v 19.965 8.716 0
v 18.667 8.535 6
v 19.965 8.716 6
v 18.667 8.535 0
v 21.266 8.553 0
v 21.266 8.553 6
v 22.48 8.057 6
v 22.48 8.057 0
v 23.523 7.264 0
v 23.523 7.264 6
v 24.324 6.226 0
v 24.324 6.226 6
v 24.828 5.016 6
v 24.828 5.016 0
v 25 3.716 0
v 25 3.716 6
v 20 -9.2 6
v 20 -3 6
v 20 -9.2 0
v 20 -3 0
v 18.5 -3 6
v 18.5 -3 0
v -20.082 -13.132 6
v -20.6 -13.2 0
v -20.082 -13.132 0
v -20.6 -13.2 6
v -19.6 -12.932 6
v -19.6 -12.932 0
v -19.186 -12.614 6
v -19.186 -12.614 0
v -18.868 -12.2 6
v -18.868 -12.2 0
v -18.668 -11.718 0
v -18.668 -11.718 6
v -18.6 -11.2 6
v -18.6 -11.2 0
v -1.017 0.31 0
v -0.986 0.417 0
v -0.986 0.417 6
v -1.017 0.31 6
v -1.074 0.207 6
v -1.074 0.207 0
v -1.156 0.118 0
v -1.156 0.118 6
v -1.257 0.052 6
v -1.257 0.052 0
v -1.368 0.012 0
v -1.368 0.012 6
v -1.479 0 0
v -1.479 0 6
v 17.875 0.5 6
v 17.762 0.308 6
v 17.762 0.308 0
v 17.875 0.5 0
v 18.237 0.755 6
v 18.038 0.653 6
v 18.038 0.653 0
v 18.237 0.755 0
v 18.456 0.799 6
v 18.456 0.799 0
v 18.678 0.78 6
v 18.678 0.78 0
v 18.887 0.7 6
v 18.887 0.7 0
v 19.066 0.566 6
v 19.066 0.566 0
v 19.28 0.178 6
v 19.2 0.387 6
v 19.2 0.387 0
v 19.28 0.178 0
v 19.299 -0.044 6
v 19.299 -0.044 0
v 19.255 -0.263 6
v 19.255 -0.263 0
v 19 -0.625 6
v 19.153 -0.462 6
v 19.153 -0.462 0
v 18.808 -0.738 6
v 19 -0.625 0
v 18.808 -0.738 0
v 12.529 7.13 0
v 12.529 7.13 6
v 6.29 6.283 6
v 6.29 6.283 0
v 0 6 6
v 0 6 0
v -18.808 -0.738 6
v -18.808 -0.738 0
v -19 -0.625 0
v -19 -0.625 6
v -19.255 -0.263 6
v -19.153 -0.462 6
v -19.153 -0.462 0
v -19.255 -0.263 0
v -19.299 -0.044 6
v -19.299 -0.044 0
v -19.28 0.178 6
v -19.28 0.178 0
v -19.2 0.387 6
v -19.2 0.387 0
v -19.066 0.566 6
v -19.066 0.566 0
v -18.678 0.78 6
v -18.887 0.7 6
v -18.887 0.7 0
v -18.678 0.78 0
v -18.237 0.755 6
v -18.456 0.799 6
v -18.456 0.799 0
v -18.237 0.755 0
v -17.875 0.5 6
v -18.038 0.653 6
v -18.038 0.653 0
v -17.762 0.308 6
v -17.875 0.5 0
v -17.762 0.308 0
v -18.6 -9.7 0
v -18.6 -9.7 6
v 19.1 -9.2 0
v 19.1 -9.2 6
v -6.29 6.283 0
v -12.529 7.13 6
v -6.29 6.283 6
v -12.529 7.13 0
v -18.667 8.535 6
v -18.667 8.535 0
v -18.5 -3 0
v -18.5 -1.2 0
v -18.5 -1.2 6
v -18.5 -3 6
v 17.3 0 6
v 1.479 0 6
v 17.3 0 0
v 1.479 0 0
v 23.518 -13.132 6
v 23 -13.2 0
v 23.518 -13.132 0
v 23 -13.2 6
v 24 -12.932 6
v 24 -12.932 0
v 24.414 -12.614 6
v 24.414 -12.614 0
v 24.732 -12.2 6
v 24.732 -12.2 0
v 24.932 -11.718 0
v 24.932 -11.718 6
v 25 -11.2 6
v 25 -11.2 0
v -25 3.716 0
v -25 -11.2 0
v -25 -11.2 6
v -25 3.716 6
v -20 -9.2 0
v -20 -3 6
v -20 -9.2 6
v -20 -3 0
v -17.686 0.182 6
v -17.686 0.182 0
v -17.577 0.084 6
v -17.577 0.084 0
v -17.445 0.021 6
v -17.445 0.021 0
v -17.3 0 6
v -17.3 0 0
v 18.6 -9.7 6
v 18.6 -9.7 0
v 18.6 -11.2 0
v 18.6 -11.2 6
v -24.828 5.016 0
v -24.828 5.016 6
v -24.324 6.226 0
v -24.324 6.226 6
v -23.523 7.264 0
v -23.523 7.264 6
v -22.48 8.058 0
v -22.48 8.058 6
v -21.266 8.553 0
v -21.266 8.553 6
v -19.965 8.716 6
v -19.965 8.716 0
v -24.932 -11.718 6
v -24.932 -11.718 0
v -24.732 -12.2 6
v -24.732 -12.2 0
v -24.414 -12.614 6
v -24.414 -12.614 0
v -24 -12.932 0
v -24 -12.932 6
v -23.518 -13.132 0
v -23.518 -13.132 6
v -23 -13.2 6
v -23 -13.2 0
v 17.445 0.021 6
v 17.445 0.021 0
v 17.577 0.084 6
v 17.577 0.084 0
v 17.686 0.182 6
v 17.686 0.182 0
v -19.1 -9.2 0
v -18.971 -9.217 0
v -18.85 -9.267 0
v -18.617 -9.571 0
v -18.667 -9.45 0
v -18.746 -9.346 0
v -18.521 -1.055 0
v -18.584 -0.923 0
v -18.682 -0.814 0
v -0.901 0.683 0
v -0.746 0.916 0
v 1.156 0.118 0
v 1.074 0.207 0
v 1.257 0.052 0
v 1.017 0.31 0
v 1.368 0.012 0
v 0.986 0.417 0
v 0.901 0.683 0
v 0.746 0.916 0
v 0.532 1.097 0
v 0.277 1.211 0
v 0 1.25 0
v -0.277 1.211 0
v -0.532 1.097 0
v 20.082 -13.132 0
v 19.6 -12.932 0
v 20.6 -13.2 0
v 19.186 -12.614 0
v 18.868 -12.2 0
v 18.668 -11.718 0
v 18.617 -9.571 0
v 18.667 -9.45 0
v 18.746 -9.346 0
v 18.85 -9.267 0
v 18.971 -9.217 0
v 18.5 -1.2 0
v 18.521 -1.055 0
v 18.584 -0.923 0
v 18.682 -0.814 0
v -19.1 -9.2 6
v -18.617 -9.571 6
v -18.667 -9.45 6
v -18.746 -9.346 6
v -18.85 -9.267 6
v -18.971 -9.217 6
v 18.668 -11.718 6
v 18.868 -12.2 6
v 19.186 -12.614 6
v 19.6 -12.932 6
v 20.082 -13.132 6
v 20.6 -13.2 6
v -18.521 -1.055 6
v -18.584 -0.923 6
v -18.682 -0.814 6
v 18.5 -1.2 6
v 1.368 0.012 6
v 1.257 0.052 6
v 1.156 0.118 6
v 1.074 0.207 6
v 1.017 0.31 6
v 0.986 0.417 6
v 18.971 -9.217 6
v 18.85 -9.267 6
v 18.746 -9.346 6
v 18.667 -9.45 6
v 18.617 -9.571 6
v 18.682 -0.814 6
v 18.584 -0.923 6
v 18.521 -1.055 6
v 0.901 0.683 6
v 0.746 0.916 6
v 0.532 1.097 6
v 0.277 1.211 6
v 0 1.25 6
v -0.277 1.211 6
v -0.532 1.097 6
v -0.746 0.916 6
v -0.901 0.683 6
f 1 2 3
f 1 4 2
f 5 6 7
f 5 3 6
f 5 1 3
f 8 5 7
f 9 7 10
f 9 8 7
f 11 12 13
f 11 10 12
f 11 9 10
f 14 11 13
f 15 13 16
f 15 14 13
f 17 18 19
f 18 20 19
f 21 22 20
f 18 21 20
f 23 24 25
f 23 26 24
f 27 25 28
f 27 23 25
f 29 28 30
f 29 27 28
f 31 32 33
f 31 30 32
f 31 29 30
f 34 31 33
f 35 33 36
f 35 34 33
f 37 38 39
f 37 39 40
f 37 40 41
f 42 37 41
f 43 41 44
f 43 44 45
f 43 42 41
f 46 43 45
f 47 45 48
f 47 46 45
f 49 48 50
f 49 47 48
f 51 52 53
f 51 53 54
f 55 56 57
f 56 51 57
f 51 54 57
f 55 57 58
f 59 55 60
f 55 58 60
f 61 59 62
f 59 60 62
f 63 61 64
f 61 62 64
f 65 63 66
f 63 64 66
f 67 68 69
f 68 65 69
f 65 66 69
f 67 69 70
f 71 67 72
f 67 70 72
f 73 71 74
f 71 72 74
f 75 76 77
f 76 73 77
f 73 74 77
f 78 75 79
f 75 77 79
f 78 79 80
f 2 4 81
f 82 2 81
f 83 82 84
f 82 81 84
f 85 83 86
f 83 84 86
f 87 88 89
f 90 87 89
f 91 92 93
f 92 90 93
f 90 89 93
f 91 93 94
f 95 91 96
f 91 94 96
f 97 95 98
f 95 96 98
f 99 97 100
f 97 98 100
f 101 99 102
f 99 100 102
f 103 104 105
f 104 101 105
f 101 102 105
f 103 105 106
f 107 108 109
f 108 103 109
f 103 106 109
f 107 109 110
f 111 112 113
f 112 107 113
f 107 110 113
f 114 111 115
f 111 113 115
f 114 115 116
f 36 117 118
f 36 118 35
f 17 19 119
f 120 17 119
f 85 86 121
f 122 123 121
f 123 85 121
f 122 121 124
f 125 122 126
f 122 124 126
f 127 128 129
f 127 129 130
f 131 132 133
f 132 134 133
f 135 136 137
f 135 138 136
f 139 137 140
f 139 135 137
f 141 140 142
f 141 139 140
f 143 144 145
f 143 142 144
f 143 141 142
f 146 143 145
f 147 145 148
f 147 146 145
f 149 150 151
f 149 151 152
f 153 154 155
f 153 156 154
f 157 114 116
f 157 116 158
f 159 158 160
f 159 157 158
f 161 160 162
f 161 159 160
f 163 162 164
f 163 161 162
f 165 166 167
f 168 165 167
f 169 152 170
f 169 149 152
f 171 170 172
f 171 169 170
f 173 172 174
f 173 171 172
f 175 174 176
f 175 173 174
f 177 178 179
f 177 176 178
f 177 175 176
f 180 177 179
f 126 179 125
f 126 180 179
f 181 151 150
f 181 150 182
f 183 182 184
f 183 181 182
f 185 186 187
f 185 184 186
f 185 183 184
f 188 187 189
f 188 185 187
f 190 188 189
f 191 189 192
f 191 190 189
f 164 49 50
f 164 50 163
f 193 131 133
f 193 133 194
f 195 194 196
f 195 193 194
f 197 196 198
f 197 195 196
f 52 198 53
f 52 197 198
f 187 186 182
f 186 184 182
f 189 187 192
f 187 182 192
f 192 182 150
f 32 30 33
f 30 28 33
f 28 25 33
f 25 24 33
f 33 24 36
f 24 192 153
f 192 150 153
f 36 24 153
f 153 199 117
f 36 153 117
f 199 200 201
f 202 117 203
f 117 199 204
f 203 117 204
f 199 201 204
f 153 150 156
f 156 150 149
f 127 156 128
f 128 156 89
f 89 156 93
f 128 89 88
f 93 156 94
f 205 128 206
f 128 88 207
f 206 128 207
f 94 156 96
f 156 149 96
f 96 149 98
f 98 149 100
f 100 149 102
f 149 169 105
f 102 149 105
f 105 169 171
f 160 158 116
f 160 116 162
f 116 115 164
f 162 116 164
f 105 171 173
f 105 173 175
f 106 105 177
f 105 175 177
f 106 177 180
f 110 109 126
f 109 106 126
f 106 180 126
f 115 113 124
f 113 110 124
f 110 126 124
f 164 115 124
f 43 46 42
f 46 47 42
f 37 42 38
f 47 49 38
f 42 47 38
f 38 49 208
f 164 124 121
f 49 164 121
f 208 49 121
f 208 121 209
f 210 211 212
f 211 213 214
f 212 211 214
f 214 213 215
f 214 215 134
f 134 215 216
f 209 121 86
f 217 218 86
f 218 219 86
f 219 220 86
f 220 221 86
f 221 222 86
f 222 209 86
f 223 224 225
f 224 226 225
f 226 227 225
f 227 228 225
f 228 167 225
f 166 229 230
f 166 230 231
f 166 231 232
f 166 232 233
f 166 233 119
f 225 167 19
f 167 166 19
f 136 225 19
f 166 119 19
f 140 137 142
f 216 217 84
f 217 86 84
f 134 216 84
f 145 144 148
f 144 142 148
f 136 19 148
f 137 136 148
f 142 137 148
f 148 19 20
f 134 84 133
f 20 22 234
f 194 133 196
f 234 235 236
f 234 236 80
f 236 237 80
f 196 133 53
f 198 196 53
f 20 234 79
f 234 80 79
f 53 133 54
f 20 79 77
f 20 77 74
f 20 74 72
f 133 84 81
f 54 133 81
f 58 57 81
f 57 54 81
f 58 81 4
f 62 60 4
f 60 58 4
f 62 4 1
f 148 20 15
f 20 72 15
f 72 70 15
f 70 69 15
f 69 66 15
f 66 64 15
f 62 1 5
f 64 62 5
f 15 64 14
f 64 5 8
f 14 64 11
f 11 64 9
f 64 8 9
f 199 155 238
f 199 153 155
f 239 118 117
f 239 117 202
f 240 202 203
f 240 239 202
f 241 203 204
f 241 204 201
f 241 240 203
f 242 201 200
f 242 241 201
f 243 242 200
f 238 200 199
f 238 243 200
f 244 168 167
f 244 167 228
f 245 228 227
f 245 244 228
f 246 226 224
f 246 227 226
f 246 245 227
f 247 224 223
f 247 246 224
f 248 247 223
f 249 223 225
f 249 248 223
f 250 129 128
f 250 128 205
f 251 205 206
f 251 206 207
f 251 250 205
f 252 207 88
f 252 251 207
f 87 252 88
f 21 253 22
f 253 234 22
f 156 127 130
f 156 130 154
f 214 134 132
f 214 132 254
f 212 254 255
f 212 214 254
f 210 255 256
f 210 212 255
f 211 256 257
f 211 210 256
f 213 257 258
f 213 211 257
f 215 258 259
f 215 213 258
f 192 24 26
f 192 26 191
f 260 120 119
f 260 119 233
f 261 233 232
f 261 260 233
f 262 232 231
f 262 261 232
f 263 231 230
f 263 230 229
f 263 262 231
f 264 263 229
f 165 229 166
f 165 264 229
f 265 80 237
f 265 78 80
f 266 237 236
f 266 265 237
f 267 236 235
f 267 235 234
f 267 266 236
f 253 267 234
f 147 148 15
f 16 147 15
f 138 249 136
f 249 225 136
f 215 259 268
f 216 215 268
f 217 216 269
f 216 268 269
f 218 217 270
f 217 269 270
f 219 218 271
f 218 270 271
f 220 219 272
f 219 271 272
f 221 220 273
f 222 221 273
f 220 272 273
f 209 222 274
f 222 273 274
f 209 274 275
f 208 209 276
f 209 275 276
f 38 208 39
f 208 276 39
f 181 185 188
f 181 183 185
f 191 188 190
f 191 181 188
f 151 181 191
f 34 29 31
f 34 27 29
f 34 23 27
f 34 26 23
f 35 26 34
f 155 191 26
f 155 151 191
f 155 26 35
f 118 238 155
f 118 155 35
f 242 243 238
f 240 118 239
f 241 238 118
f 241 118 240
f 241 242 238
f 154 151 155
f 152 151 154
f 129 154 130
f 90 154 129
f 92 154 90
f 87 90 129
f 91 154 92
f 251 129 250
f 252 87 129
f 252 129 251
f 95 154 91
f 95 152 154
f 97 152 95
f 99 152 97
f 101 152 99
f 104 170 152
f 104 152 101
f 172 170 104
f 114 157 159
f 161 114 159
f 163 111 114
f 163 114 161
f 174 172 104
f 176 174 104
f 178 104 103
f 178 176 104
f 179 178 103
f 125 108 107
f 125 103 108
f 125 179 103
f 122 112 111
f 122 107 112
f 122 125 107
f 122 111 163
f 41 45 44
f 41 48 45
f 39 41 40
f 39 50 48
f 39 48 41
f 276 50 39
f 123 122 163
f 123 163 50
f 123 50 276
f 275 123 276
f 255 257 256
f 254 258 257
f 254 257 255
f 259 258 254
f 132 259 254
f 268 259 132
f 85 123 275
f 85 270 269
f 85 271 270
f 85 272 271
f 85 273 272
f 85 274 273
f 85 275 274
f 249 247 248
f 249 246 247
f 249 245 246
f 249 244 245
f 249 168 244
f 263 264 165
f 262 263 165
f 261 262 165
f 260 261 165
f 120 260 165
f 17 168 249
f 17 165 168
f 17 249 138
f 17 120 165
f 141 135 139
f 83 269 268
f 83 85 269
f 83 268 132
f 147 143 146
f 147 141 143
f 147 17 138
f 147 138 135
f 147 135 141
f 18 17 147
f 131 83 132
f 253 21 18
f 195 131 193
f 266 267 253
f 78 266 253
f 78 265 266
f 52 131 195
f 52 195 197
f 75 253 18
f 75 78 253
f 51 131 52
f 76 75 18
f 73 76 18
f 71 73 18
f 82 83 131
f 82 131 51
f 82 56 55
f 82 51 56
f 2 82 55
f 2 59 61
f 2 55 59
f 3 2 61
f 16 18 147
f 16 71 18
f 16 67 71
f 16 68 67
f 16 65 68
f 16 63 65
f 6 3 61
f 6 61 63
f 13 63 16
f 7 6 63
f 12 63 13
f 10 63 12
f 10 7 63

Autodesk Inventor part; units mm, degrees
ref_plane "YZ Plane" through (0, 0, 0) normal (1, 0, 0) x (0, 1, 0)
ref_plane "XZ Plane" through (0, 0, 0) normal (0, 1, 0) x (-1, 0, 0)
ref_plane "XY Plane" through (0, 0, 0) normal (0, 0, 1) x (1, 0, 0)
sketch "Sketch1" plane through (0, 0, 0) normal (0, 0, 1) x (1, 0, 0)
  line L0 (0, 0) -> (-17.7, 0)
  line L1 (-20, -9.2) -> (-18.6, -9.2)
  line L2 (-18.6, -9.2) -> (-18.6, -13.2)
  line L3 (-18.6, -13.2) -> (-25, -13.2)
  line L4 (-25, -13.2) -> (-25, 3.7158)
  arc A0 (-18.6667, 8.5348) -> (-25, 3.7158) centre (-20, 3.7158) ccw
  arc A1 (-18.6667, 8.5348) -> (0, 6) centre (0, 76) ccw
  line L5 (0, 0) -> (0, 6) construction
  line L6 (-18.5, -0.8) -> (-18.5, -3)
  line L7 (-18.5, -3) -> (-20, -3)
  line L8 (-20, -3) -> (-20, -9.2)
  arc A2 (-17.7, 0) -> (-18.5, -0.8) centre (-18.5, 0) ccw
  line L9 (0, 0) -> (17.7, 0)
  line L10 (20, -9.2) -> (18.6, -9.2)
  line L11 (18.6, -9.2) -> (18.6, -13.2)
  line L12 (18.6, -13.2) -> (25, -13.2)
  line L13 (25, -13.2) -> (25, 3.7158)
  arc A3 (25, 3.7158) -> (18.6667, 8.5348) centre (20, 3.7158) ccw
  arc A4 (0, 6) -> (18.6667, 8.5348) centre (0, 76) ccw
  line L14 (18.5, -0.8) -> (18.5, -3)
  line L15 (18.5, -3) -> (20, -3)
  line L16 (20, -3) -> (20, -9.2)
  arc A5 (18.5, -0.8) -> (17.7, 0) centre (18.5, 0) ccw
  line L17 (-20, 8.7158) -> (20, 8.7158) construction
  dimension "d0" = 6
  dimension "d4" = 6.2
  dimension "d5" = 1.5
  dimension "d7" = 4
  dimension "d9" = 5
  dimension "d10" = 70
  dimension "d11" = 5
  dimension "d12" = 0.8
  dimension "d13" = 3
  dimension "d18" = 1.4
  dimension "d20" = 18.5
  dimension "d26" = 8.7158
extrude "Extrusion1" add sketch "Sketch1" along normal blind 6
fillet "Fillet1" radius 2 4 edges at (-18.6, -13.2, 3) (-25, -13.2, 3) (18.6, -13.2, 3) (25, -13.2, 3)
fillet "Fillet2" radius 0.5 2 edges at (-18.6, -9.2, 3) (18.6, -9.2, 3)
fillet "Fillet3" radius 0.5 4 edges at (-18.5, -0.8, 3) (-17.7, 0, 3) (17.7, 0, 3) (18.5, -0.8, 3)
sketch "Sketch2" plane through (0, 0, 6) normal (0, 0, 1) x (1, 0, 0)
  arc A0 (1, 0.25) -> (-1, 0.25) centre (0, 0.25) ccw
  line L0 (-17.3, 0) -> (17.3, 0) projected
  line L1 (-1, 0.25) -> (-1, 0)
  line L2 (1, 0.25) -> (1, 0)
  point P0 (0, 0)
  point P1 (0, 0)
  dimension "d21" = 0.25
  dimension "d25" = 1
extrude "Extrusion2" cut sketch "Sketch2" against normal through all
fillet "Fillet4" radius 0.5 2 edges at (-1, 0, 3) (1, 0, 3)
equation "\"d5\" = GripLength"
equation "\"d20\" = 0.5 * BattECOD - GripLength"
equation "\"GripLength\" = 1.5"
equation "\"BattECOD\" = 40"
properties part number "Twist Lock"
